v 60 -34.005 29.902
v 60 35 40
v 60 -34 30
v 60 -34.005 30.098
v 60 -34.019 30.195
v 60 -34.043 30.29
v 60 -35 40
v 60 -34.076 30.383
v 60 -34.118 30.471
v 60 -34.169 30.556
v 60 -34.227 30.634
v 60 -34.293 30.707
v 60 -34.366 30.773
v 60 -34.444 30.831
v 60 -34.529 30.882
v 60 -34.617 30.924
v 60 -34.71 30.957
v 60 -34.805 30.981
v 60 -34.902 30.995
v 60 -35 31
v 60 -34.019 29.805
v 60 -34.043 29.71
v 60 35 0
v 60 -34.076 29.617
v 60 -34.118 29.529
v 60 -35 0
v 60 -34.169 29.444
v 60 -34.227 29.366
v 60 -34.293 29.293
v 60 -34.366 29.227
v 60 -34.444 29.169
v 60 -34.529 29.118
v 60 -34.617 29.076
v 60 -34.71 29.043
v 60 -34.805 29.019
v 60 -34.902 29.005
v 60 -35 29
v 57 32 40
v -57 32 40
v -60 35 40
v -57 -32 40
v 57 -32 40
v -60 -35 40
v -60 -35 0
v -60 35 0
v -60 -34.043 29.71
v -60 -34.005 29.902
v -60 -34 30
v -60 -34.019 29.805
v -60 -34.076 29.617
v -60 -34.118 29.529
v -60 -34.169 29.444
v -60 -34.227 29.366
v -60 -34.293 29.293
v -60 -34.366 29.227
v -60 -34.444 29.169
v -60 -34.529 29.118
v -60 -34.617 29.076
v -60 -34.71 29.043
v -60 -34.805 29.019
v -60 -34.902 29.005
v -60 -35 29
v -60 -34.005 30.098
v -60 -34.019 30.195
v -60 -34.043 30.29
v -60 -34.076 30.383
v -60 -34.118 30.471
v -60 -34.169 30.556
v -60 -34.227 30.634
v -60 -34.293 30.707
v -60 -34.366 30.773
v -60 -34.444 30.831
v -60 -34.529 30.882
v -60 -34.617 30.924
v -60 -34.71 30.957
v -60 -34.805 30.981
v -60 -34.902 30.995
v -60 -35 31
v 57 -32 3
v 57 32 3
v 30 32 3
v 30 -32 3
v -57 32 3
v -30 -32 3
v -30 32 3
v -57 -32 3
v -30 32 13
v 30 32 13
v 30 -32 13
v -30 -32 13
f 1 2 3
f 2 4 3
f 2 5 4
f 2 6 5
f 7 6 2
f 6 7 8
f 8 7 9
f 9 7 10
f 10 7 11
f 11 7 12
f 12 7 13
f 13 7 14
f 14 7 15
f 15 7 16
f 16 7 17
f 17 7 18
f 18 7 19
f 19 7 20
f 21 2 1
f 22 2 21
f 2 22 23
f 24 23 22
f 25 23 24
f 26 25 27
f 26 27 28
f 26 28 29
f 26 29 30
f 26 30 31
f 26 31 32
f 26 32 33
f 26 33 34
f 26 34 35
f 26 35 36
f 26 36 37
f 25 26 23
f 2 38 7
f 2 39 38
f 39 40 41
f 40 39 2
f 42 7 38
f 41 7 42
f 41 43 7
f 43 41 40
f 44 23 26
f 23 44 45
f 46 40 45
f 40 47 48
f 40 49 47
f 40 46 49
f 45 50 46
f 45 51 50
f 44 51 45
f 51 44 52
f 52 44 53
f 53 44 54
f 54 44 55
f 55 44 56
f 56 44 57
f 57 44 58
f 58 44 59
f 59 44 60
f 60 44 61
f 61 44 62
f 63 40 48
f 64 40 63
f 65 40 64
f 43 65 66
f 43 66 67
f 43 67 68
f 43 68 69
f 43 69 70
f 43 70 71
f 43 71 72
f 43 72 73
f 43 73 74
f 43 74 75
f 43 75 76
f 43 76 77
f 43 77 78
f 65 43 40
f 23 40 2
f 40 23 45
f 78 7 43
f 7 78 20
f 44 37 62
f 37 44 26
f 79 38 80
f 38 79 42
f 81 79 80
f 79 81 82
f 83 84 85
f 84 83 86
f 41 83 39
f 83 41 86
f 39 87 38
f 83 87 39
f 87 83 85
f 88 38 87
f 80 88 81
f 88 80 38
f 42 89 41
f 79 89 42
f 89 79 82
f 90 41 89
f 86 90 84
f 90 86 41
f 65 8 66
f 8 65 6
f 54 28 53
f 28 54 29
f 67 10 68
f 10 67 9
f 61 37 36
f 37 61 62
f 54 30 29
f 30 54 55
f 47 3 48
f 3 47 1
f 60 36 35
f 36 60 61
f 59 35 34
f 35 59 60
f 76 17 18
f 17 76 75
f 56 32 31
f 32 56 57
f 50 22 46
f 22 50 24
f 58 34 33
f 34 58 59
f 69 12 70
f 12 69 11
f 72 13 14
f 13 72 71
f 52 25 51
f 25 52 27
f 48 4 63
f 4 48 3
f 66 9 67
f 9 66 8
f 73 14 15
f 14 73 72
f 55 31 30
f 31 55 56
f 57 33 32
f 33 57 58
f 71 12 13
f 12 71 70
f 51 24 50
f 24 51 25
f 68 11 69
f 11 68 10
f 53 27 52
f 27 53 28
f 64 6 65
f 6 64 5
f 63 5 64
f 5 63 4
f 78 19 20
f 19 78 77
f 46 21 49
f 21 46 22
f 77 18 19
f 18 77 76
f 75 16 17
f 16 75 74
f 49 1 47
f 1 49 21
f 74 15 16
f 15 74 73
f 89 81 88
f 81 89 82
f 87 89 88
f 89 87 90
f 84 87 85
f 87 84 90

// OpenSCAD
// Buffer tank for mini horizontal gel-electrophoresis box
// Corrected: Rests on Z=0, holes correctly pass through X-axis.

// --- Dimensions ---
length_outer = 120.0;    // X dimension
width_outer  = 70.0;     // Y dimension
height_outer = 40.0;     // Z dimension
wall_thick   = 3.0;      // Wall thickness
floor_thick  = 3.0;      // Floor thickness
platform_len = 60.0;      // Length of the central platform in X
platform_h_top = 13.0;   // Height of platform top from the absolute bottom (z=13)
hole_dia     = 2.0;      // Diameter of electrode wire holes
hole_y       = 0.0;      // Y position of holes (centered on Y axis)
hole_z       = 30.0;     // Z position of holes (from absolute bottom)

$fn = 64;

// --- Calculations ---
inner_x = length_outer - 2 * wall_thick;
inner_y = width_outer - 2 * wall_thick;

// We build the part starting at Z=0.
// To center on XY, we translate the final result.

module tank_geometry() {
    difference() {
        // 1. The main outer block
        cube([length_outer, width_outer, height_outer]);

        // 2. Subtract the inner void
        translate([wall_thick, wall_thick, floor_thick])
            cube([inner_x, inner_y, height_outer]);

        // 3. Subtract the electrode holes
        // The holes are horizontal along X, passing through the center of Y and Z.
        // We use a long cylinder to ensure it cuts through both end walls.
        translate([-1, hole_y, hole_z])
            rotate([0, 90, 0])
                cylinder(h = length_outer + 2, d = hole_dia);
    }

    // 4. Add the platform (Unioned with the tank body)
    // The platform is inside the tank.
    // Top is at Z=13, Bottom is at Z=3 (floor top).
    translate([
        (length_outer - platform_len) / 2, 
        wall_thick, 
        floor_thick
    ])
    cube([platform_len, inner_y, platform_h_top - floor_thick]);
}

// Final Assembly:
// The geometry is built from [0,0,0] to [120,70,40].
// We translate it so it is centered on the XY plane.
translate([-length_outer/2, -width_outer/2, 0])
    tank_geometry();
